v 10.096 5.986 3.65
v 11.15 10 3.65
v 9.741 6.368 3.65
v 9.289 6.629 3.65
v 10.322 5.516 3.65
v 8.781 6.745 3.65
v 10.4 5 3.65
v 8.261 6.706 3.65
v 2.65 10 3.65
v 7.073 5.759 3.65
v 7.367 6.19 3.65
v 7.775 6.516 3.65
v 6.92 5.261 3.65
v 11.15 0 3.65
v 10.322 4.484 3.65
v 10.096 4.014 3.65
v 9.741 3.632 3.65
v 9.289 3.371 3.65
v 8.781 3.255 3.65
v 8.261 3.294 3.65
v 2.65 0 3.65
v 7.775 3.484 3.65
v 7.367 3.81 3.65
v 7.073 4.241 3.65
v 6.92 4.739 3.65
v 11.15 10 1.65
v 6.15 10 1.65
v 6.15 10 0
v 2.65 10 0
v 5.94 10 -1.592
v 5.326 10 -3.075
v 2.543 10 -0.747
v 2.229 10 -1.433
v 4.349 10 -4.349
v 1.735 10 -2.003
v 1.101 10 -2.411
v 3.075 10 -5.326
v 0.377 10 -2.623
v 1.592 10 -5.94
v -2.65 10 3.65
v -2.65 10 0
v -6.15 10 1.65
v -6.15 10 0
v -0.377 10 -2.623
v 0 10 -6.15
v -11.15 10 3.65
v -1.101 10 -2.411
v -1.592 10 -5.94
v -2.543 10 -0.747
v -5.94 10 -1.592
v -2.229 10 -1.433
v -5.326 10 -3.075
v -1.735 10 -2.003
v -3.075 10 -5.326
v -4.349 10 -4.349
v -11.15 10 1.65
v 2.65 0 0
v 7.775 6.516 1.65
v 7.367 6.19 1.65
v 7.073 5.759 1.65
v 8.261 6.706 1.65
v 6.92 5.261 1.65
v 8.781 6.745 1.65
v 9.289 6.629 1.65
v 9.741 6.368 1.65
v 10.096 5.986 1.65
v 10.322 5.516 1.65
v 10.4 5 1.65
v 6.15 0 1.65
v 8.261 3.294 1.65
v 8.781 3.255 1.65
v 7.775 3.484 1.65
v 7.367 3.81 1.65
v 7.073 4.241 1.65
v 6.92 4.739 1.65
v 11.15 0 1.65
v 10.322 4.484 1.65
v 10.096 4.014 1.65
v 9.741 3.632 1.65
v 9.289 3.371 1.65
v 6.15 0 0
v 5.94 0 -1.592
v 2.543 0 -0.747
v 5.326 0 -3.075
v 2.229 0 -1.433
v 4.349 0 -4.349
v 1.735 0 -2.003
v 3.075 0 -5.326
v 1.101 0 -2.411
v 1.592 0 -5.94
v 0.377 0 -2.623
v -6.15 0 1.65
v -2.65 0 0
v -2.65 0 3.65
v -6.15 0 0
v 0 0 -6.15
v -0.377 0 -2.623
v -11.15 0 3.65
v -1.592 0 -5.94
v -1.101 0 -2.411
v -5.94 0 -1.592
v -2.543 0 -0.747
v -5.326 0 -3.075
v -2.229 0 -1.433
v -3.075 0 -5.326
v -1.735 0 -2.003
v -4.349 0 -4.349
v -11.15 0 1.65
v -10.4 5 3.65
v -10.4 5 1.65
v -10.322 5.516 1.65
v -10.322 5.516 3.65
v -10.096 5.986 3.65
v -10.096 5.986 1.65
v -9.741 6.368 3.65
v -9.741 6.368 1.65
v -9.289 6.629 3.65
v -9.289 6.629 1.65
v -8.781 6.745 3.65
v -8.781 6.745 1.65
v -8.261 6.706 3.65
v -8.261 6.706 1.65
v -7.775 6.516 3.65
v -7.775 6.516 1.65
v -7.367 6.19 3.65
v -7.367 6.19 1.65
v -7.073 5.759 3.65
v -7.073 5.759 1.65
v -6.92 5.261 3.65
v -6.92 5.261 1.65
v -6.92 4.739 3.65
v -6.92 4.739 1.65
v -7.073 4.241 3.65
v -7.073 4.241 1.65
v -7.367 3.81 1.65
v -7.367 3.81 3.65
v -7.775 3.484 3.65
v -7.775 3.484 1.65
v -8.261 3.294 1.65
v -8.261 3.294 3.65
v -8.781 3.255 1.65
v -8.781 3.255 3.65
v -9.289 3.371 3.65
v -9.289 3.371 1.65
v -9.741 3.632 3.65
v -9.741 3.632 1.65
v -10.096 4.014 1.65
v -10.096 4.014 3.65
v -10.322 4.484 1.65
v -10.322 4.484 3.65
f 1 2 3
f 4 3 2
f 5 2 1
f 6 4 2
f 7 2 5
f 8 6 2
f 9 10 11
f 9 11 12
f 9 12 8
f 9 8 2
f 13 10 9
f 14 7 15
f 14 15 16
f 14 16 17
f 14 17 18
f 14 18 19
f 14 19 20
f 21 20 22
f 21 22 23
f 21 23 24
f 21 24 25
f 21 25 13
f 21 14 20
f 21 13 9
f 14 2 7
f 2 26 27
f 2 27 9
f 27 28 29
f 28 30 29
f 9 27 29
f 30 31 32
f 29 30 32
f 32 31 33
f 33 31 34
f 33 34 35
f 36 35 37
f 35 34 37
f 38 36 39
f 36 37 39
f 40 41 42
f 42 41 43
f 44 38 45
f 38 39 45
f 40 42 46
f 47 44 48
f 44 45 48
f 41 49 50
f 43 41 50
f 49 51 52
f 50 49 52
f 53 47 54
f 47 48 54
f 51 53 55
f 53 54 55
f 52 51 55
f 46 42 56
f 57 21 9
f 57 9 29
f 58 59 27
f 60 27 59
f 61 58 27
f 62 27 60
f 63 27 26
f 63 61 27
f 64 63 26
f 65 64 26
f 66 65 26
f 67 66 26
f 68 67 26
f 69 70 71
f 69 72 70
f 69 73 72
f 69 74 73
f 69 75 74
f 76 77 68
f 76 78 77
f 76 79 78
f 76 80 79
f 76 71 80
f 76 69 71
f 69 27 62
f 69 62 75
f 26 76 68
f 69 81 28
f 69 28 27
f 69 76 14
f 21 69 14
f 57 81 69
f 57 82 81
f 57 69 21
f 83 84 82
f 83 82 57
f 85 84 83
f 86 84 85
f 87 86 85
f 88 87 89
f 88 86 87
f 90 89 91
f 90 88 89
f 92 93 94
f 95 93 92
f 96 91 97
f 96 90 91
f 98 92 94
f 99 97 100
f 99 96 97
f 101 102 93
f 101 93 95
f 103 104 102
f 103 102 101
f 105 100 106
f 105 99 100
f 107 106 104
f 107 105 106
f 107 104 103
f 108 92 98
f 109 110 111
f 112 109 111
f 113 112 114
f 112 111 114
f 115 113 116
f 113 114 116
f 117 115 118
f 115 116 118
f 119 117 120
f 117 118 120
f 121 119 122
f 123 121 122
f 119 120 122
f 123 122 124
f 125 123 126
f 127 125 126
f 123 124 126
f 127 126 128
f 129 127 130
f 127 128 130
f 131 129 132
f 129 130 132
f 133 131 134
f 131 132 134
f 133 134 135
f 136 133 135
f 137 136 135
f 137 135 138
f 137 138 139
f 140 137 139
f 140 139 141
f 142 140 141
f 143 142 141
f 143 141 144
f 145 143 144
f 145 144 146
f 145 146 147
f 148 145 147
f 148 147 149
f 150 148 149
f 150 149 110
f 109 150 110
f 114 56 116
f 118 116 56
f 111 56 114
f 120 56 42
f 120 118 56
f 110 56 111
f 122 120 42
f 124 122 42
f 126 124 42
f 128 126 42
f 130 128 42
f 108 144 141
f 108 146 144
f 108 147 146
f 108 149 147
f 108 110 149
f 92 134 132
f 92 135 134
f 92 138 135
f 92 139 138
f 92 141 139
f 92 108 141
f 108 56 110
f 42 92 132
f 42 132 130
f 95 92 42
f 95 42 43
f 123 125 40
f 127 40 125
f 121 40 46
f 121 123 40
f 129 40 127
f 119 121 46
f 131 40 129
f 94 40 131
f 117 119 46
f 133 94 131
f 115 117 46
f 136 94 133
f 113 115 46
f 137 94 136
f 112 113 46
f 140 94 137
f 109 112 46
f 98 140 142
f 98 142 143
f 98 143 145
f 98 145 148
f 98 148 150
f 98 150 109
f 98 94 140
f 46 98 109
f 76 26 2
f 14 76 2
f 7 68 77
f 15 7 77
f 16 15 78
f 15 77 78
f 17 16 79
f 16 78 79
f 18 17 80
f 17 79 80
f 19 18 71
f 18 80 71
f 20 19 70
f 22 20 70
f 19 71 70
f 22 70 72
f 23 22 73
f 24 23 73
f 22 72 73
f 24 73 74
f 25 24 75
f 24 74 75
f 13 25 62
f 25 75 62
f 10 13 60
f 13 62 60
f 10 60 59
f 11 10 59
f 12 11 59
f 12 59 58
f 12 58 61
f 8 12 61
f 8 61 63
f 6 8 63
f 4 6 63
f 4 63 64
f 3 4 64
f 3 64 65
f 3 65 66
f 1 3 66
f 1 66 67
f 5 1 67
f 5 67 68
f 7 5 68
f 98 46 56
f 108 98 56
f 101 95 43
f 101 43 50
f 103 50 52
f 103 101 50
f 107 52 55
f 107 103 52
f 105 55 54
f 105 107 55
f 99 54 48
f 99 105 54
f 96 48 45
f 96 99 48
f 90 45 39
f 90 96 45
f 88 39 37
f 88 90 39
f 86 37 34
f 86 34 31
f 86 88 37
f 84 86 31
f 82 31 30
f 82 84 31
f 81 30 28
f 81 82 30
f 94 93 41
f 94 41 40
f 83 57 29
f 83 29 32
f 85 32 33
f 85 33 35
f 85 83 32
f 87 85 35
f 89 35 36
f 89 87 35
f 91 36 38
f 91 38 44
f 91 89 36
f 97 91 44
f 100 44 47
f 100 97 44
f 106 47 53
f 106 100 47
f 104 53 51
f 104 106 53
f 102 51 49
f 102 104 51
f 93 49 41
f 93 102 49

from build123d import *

# Parameters (mm, degrees)
EXTRUDE_1_DEPTH     = 10
SKETCH_2_R          = 1.75
CUT_EXTRUDE_1_DEPTH = 10


with BuildPart() as part:
    # 草图1 → 凸台-拉伸1 (new body)
    with BuildSketch(Plane(origin=(0, 0, 0), x_dir=(1, 0, 0), z_dir=(0, 1, 0))):
        with BuildLine():
            Line((6.15, 0), (6.15, -1.65))
            Line((6.15, -1.65), (11.15, -1.65))
            Line((11.15, -1.65), (11.15, -3.65))
            Line((11.15, -3.65), (6.15, -3.65))
            Line((6.15, -3.65), (2.65, -3.65))
            Line((2.65, -3.65), (2.65, -2.65))
            Line((2.65, -2.65), (2.65, 0))
            ThreePointArc((2.65, 0), (0, 2.65), (-2.65, 0))
            Line((-2.65, 0), (-2.65, -2.65))
            Line((-2.65, -2.65), (-2.65, -3.65))
            Line((-2.65, -3.65), (-6.15, -3.65))
            Line((-6.15, -3.65), (-11.15, -3.65))
            Line((-11.15, -3.65), (-11.15, -1.65))
            Line((-11.15, -1.65), (-6.15, -1.65))
            Line((-6.15, -1.65), (-6.15, 0))
            ThreePointArc((-6.15, 0), (0, 6.15), (6.15, 0))
        make_face()
    extrude(amount=EXTRUDE_1_DEPTH)

    # 草图2 → 切除-拉伸1 (cut)
    with BuildSketch(Plane(origin=(0, 0, 1.65), x_dir=(-1, 0, 0), z_dir=(0, 0, -1))):
        with Locations((8.65, 5)):
            Circle(SKETCH_2_R)
        with Locations(Location((-8.65, 5, 0), (0, 0, 180))):
            Circle(SKETCH_2_R)
    extrude(amount=-CUT_EXTRUDE_1_DEPTH, mode=Mode.SUBTRACT)


solid = part.part
